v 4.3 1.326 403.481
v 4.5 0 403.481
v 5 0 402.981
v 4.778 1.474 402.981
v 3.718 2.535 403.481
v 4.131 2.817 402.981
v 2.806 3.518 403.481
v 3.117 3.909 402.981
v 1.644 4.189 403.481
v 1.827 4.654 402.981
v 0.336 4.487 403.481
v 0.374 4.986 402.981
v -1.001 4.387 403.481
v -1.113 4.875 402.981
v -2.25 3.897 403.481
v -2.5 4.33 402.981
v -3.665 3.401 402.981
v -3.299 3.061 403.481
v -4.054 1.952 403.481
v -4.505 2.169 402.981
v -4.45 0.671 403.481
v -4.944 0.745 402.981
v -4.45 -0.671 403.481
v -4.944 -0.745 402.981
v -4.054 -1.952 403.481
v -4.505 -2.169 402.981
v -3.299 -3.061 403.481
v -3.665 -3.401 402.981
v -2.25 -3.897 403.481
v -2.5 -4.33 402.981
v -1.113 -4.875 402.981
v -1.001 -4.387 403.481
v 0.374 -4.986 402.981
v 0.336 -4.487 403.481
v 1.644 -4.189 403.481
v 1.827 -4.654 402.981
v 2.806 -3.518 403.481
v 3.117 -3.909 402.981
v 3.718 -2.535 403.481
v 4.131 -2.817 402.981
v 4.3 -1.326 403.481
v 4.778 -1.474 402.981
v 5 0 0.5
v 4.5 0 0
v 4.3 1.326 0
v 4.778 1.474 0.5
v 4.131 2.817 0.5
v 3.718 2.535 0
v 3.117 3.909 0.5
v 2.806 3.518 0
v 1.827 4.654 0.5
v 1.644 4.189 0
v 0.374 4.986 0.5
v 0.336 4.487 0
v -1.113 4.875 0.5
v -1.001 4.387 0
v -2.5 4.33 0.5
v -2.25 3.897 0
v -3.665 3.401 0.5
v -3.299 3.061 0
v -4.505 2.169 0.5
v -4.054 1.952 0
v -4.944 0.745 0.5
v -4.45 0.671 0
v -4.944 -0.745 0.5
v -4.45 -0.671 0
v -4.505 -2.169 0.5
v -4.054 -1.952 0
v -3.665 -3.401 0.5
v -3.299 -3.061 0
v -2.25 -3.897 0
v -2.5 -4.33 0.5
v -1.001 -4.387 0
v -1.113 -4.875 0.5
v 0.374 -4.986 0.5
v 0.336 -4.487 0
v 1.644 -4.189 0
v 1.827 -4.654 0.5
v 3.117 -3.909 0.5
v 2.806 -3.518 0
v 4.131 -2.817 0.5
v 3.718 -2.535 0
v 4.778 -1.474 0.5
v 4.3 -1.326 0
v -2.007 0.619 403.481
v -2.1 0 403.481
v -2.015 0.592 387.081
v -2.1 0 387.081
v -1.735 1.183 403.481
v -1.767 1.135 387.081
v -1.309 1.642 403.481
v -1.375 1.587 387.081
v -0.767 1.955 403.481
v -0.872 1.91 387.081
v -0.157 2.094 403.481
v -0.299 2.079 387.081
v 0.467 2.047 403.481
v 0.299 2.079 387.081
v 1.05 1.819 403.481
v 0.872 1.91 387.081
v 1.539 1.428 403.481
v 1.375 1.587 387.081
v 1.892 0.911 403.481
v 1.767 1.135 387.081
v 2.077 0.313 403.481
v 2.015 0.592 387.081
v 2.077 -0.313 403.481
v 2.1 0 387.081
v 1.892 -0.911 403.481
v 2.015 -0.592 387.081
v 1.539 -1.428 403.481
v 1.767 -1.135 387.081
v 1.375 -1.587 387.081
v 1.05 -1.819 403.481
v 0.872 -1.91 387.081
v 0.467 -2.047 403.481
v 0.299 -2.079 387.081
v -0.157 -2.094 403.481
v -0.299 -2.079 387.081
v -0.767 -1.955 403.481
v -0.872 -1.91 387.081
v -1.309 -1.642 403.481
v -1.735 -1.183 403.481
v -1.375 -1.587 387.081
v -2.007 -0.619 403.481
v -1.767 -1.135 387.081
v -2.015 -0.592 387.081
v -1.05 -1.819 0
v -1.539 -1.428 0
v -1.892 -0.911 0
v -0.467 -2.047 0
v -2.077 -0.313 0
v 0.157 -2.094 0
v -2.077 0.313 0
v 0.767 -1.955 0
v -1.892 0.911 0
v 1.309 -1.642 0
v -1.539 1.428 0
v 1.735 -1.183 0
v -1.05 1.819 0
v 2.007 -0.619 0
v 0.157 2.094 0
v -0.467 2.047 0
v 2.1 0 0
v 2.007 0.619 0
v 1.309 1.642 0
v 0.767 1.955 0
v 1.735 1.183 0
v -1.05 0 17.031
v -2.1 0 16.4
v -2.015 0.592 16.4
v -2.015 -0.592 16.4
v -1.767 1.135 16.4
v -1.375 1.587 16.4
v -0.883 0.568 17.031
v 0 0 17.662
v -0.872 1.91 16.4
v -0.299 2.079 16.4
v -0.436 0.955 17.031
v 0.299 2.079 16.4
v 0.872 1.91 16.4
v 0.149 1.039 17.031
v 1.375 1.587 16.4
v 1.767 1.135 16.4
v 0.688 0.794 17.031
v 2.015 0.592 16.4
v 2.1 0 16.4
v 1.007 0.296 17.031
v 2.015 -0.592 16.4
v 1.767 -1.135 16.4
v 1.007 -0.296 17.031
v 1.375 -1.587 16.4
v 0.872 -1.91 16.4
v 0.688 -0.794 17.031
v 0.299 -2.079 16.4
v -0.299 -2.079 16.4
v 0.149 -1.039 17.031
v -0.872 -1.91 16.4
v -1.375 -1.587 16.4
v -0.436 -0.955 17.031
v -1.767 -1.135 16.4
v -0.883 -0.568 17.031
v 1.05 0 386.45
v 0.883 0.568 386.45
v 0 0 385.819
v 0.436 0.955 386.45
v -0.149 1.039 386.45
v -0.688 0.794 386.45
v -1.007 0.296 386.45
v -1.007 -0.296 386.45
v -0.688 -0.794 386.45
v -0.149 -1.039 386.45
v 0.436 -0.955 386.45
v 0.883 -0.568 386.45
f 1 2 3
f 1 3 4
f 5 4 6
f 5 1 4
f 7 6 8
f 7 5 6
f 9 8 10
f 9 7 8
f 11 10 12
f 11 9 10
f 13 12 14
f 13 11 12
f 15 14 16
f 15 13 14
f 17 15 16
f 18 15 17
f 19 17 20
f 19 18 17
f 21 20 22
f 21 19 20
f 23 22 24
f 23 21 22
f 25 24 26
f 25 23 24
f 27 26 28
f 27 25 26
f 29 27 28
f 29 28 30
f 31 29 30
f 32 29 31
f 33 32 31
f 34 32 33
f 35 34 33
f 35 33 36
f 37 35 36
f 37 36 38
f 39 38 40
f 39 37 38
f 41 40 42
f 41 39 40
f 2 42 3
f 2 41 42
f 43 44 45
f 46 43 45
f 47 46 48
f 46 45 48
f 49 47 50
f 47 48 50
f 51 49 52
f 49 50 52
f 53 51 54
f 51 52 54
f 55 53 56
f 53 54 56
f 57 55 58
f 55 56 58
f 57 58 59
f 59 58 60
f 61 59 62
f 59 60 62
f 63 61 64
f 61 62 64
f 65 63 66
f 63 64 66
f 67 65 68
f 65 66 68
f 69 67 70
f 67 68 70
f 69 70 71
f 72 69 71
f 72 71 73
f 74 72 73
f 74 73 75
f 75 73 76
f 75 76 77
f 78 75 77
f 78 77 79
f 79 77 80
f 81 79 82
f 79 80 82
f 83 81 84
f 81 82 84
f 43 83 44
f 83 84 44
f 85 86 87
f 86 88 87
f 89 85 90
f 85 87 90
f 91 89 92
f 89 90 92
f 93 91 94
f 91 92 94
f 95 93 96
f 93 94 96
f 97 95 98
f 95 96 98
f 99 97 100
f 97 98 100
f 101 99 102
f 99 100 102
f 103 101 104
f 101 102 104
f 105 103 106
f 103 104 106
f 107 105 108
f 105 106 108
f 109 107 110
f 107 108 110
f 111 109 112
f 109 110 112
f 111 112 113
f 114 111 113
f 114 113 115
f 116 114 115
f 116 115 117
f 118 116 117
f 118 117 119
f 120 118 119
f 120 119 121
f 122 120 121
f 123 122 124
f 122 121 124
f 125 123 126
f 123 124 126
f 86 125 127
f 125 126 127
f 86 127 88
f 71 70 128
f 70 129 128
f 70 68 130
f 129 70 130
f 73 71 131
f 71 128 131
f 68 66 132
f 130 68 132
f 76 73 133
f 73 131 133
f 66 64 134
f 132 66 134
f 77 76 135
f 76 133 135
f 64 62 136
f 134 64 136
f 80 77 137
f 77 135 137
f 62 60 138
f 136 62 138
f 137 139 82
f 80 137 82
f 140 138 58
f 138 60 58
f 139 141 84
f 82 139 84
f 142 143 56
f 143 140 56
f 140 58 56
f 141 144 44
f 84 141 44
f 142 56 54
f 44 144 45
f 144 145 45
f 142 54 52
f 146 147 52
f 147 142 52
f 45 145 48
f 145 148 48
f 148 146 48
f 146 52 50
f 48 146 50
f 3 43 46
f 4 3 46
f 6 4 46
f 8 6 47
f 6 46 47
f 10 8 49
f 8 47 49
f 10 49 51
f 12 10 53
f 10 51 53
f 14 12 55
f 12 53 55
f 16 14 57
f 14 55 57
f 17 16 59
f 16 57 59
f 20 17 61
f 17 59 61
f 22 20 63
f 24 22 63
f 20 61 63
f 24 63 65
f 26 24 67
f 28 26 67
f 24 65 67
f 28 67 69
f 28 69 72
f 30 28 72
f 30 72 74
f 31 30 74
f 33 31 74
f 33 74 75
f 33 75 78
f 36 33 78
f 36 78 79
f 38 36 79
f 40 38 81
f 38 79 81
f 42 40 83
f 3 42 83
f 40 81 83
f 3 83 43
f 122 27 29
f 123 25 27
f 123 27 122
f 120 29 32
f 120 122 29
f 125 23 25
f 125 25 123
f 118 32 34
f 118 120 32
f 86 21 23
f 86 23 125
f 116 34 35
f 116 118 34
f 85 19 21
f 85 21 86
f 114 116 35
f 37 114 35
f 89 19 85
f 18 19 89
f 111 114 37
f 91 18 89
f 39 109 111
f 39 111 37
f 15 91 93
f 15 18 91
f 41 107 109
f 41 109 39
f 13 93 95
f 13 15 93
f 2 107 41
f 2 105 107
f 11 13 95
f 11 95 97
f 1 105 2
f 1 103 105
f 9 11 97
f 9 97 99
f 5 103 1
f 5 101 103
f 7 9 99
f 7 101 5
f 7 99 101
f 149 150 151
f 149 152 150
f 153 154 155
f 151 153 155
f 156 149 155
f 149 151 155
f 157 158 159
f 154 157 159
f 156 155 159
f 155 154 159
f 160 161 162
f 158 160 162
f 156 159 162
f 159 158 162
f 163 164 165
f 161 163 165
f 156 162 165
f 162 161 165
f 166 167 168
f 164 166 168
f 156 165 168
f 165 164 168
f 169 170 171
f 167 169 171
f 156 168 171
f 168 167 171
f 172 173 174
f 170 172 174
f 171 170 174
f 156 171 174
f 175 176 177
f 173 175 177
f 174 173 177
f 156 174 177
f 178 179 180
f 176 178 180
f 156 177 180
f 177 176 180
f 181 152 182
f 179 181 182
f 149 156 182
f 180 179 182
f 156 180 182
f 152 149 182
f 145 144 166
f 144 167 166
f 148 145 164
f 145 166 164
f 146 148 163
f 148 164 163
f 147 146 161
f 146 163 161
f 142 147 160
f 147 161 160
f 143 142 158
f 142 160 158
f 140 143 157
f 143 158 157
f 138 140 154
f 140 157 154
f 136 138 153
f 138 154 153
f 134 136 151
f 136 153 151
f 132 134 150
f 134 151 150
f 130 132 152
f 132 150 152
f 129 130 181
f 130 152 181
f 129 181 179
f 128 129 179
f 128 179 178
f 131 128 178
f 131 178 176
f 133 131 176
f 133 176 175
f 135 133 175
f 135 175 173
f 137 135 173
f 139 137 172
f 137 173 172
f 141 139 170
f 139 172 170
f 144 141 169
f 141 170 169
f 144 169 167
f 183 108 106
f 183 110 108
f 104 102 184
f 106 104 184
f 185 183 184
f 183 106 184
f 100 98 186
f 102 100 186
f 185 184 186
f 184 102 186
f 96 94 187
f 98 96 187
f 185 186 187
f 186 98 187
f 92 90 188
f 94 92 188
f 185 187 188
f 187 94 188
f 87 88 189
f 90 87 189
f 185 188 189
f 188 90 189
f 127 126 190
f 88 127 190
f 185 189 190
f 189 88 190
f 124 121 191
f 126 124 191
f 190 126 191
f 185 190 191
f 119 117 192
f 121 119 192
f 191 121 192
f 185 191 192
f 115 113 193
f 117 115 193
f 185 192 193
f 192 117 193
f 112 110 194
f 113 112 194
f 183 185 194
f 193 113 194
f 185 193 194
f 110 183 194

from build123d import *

# Parameters (mm, degrees)
SKETCH1_R                           = 5
BOSS_EXTRUDE1_DEPTH                 = 403.4811
CHAMFER1_SIZE                       = 0.5
M5X0_8_TAPPED_HOLE1_D               = 4.2
M5X0_8_TAPPED_HOLE1_DEPTH           = 16.4
M5X0_8_TAPPED_HOLE1_TIP             = 1.2618073
M5X0_8_TAPPED_HOLE1_ON_FACE_2_D     = 4.2
M5X0_8_TAPPED_HOLE1_ON_FACE_2_DEPTH = 16.4
M5X0_8_TAPPED_HOLE1_ON_FACE_2_TIP   = 1.2618073


with BuildPart() as part:
    # Sketch1 → Boss-Extrude1 (new body)
    with BuildSketch(Plane.XY):
        Circle(SKETCH1_R)
    extrude(amount=BOSS_EXTRUDE1_DEPTH)

    # Chamfer1
    chamfer1_edges = [part.edges().sort_by_distance(p)[0] for p in [
        (-5, 0, 0),
        (-5, 0, 403.4811),
    ]]
    chamfer(chamfer1_edges, length=CHAMFER1_SIZE)

    # M5x0.8 Tapped Hole1
    with Locations(Plane.XY.offset(403.4811)):
        with Locations((0, 0)):
            Hole(M5X0_8_TAPPED_HOLE1_D / 2, depth=M5X0_8_TAPPED_HOLE1_DEPTH)
            with Locations((0, 0, -(M5X0_8_TAPPED_HOLE1_DEPTH + M5X0_8_TAPPED_HOLE1_TIP / 2))):  # 118° drill point
                Cone(0, M5X0_8_TAPPED_HOLE1_D / 2, M5X0_8_TAPPED_HOLE1_TIP, mode=Mode.SUBTRACT)

    # M5x0.8 Tapped Hole1 on face 2
    with Locations(Plane(origin=(0, 0, 0), x_dir=(-1, 0, 0), z_dir=(0, 0, -1))):
        with Locations((0, 0)):
            Hole(M5X0_8_TAPPED_HOLE1_ON_FACE_2_D / 2, depth=M5X0_8_TAPPED_HOLE1_ON_FACE_2_DEPTH)
            with Locations((0, 0, -(M5X0_8_TAPPED_HOLE1_ON_FACE_2_DEPTH + M5X0_8_TAPPED_HOLE1_ON_FACE_2_TIP / 2))):  # 118° drill point
                Cone(0, M5X0_8_TAPPED_HOLE1_ON_FACE_2_D / 2, M5X0_8_TAPPED_HOLE1_ON_FACE_2_TIP, mode=Mode.SUBTRACT)


solid = part.part
